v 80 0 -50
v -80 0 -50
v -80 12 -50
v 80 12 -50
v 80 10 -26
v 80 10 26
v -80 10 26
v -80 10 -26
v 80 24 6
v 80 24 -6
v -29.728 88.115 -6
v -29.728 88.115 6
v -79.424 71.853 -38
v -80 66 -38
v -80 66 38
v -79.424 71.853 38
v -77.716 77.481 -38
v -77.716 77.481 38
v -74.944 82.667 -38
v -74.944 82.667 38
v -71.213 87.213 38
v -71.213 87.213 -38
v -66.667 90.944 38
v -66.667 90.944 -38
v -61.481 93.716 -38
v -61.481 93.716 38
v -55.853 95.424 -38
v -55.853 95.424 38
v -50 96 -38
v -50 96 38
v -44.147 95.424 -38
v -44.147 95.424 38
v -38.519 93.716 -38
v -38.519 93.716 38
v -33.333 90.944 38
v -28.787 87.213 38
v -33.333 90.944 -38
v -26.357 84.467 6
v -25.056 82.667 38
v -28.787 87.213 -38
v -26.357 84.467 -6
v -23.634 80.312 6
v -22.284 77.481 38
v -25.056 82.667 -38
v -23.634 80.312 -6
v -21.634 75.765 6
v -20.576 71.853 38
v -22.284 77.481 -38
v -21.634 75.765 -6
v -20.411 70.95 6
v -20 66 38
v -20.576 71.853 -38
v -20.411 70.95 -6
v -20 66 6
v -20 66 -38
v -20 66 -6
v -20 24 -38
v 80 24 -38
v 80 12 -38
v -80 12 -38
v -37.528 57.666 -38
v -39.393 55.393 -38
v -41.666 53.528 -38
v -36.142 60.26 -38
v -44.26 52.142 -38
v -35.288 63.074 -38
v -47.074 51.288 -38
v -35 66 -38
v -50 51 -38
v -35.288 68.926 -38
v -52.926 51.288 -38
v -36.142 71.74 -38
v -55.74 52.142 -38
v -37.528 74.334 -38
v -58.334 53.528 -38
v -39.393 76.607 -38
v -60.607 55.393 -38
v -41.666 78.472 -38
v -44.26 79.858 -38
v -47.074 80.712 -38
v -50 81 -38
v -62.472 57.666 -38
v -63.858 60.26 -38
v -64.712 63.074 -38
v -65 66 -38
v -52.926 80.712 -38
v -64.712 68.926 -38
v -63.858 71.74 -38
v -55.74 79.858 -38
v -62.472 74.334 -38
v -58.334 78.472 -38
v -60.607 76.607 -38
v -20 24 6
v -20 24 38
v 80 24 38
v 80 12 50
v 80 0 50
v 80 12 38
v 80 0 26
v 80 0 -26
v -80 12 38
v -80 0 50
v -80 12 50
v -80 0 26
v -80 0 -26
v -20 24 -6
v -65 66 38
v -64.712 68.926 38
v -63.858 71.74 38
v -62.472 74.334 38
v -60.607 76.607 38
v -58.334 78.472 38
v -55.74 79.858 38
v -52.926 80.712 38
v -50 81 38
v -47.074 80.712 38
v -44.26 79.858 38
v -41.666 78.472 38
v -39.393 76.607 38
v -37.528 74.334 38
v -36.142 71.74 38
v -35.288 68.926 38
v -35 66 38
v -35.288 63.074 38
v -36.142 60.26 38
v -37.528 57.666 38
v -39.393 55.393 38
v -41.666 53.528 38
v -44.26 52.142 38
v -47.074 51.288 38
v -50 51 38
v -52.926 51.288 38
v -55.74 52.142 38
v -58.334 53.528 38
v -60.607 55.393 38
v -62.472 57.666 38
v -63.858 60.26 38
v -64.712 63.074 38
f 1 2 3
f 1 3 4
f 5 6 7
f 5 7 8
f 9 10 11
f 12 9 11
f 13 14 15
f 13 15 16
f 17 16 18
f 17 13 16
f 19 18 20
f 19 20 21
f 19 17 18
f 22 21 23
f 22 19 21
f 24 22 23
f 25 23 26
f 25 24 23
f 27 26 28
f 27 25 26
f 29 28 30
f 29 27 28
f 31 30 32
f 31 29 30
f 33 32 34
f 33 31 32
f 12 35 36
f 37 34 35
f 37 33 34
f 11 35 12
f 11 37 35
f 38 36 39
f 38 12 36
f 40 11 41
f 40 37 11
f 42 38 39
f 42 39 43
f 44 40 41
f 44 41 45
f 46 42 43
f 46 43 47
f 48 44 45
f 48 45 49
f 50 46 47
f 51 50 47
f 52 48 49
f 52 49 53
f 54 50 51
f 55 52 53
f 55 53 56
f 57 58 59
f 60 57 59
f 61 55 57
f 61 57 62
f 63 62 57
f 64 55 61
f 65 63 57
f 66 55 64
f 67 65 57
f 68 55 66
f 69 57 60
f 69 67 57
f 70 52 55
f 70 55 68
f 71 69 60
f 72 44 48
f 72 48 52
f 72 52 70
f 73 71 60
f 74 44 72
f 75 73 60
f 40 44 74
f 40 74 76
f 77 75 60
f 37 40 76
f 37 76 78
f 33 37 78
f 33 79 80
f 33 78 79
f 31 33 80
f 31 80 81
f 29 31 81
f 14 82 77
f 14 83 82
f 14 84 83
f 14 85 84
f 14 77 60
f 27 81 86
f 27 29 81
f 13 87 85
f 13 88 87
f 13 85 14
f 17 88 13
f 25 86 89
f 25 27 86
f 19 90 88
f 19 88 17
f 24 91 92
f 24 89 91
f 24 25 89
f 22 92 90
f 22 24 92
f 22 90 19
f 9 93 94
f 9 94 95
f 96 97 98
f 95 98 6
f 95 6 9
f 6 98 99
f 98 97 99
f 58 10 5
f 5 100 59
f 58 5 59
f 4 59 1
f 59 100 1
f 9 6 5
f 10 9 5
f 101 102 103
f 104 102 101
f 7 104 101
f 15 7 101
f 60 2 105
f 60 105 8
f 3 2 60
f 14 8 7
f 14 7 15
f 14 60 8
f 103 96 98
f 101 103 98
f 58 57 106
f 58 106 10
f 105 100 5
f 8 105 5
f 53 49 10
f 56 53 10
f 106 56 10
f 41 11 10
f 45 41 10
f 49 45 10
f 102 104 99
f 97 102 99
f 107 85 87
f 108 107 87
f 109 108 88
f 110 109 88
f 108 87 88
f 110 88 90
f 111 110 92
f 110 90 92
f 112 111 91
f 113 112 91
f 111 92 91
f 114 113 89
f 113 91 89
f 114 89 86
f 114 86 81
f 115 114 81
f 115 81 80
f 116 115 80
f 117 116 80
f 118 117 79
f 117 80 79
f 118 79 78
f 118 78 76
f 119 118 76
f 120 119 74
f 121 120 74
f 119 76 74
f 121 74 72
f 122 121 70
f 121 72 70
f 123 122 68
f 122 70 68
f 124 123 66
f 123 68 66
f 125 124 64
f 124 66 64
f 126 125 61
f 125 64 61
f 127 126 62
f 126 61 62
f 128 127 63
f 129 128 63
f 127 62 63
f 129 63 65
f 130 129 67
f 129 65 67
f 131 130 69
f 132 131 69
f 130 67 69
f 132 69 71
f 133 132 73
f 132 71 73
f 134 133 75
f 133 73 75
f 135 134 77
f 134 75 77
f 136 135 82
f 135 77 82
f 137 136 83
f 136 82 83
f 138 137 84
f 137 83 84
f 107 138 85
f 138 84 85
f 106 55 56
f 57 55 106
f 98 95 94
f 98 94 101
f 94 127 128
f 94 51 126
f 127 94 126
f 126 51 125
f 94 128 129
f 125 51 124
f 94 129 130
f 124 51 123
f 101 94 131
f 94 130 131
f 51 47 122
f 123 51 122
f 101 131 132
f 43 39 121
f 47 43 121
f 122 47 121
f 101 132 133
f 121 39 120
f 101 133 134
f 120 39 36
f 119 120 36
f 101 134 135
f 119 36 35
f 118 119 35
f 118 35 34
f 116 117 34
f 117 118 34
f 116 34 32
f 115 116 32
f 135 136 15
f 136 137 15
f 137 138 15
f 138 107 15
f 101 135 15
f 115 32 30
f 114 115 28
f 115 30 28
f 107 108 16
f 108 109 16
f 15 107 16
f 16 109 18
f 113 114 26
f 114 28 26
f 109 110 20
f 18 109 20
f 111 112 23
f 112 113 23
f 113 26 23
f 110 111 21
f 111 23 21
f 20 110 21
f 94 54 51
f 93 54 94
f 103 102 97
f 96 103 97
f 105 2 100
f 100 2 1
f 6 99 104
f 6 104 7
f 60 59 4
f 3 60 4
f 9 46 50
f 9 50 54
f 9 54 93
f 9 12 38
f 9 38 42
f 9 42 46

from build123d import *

# Parameters (mm, degrees)
SKETCH1_W                = 160
SKETCH1_H                = 100
BOSS_EXTRUDE2_DEPTH      = 24
SKETCH3_W                = 52
SKETCH3_H                = 10
CUT_EXTRUDE1_DEPTH       = 160
SKETCH4_W                = 12
SKETCH4_H                = 12
CUT_EXTRUDE2_DEPTH       = 160
SKETCH5_W                = 12
SKETCH5_H                = 12
CUT_EXTRUDE3_DEPTH       = 160
SKETCH6_R                = 15
BOSS_EXTRUDE3_DEPTH      = 76
BOSS_EXTRUDE4_DEPTH      = 6
BOSS_EXTRUDE4_DEPTH_BACK = 6


with BuildPart() as part:
    # Sketch1 → Boss-Extrude2 (new body)
    with BuildSketch(Plane(origin=(0, 0, 0), x_dir=(1, 0, 0), z_dir=(0, 1, 0))):
        Rectangle(SKETCH1_W, SKETCH1_H)
    extrude(amount=BOSS_EXTRUDE2_DEPTH)

    # Sketch3 → Cut-Extrude1 (cut)
    with BuildSketch(Plane(origin=(80, 0, 0), x_dir=(0, 0, -1), z_dir=(1, 0, 0))):
        with Locations((0, 5)):
            Rectangle(SKETCH3_W, SKETCH3_H)
    extrude(amount=-CUT_EXTRUDE1_DEPTH, mode=Mode.SUBTRACT)

    # Sketch4 → Cut-Extrude2 (cut)
    with BuildSketch(Plane(origin=(80, 0, 0), x_dir=(0, 0, -1), z_dir=(1, 0, 0))):
        with Locations((44, 18)):
            Rectangle(SKETCH4_W, SKETCH4_H)
    extrude(amount=-CUT_EXTRUDE2_DEPTH, mode=Mode.SUBTRACT)

    # Sketch5 → Cut-Extrude3 (cut)
    with BuildSketch(Plane(origin=(80, 0, 0), x_dir=(0, 0, -1), z_dir=(1, 0, 0))):
        with Locations((-44, 18)):
            Rectangle(SKETCH5_W, SKETCH5_H)
    extrude(amount=-CUT_EXTRUDE3_DEPTH, mode=Mode.SUBTRACT)

    # Sketch6 → Boss-Extrude3 (add)
    with BuildSketch(Plane(origin=(0, 0, -38), x_dir=(-1, 0, 0), z_dir=(0, 0, -1))):
        with BuildLine():
            Line((80, 24), (80, 66))
            ThreePointArc((80, 66), (50, 96), (20, 66))
            Line((20, 66), (20, 24))
            Line((20, 24), (80, 24))
        make_face()
        with Locations((50, 66)):
            Circle(SKETCH6_R, mode=Mode.SUBTRACT)
    extrude(amount=-BOSS_EXTRUDE3_DEPTH)

    # Sketch7 → Boss-Extrude4 (add, two sides: drawn at the far end of the back side and taken through both)
    with BuildSketch(Plane.XY.offset(-BOSS_EXTRUDE4_DEPTH_BACK)):
        with BuildLine():
            Line((-20, 24), (80, 24))
            Line((80, 24), (-29.728388886, 88.114741301))
            ThreePointArc((-29.728388886, 88.114741301), (-22.539589101, 78.079976543), (-20, 66))
            Line((-20, 66), (-20, 24))
        make_face()
    extrude(amount=BOSS_EXTRUDE4_DEPTH + BOSS_EXTRUDE4_DEPTH_BACK)


solid = part.part
